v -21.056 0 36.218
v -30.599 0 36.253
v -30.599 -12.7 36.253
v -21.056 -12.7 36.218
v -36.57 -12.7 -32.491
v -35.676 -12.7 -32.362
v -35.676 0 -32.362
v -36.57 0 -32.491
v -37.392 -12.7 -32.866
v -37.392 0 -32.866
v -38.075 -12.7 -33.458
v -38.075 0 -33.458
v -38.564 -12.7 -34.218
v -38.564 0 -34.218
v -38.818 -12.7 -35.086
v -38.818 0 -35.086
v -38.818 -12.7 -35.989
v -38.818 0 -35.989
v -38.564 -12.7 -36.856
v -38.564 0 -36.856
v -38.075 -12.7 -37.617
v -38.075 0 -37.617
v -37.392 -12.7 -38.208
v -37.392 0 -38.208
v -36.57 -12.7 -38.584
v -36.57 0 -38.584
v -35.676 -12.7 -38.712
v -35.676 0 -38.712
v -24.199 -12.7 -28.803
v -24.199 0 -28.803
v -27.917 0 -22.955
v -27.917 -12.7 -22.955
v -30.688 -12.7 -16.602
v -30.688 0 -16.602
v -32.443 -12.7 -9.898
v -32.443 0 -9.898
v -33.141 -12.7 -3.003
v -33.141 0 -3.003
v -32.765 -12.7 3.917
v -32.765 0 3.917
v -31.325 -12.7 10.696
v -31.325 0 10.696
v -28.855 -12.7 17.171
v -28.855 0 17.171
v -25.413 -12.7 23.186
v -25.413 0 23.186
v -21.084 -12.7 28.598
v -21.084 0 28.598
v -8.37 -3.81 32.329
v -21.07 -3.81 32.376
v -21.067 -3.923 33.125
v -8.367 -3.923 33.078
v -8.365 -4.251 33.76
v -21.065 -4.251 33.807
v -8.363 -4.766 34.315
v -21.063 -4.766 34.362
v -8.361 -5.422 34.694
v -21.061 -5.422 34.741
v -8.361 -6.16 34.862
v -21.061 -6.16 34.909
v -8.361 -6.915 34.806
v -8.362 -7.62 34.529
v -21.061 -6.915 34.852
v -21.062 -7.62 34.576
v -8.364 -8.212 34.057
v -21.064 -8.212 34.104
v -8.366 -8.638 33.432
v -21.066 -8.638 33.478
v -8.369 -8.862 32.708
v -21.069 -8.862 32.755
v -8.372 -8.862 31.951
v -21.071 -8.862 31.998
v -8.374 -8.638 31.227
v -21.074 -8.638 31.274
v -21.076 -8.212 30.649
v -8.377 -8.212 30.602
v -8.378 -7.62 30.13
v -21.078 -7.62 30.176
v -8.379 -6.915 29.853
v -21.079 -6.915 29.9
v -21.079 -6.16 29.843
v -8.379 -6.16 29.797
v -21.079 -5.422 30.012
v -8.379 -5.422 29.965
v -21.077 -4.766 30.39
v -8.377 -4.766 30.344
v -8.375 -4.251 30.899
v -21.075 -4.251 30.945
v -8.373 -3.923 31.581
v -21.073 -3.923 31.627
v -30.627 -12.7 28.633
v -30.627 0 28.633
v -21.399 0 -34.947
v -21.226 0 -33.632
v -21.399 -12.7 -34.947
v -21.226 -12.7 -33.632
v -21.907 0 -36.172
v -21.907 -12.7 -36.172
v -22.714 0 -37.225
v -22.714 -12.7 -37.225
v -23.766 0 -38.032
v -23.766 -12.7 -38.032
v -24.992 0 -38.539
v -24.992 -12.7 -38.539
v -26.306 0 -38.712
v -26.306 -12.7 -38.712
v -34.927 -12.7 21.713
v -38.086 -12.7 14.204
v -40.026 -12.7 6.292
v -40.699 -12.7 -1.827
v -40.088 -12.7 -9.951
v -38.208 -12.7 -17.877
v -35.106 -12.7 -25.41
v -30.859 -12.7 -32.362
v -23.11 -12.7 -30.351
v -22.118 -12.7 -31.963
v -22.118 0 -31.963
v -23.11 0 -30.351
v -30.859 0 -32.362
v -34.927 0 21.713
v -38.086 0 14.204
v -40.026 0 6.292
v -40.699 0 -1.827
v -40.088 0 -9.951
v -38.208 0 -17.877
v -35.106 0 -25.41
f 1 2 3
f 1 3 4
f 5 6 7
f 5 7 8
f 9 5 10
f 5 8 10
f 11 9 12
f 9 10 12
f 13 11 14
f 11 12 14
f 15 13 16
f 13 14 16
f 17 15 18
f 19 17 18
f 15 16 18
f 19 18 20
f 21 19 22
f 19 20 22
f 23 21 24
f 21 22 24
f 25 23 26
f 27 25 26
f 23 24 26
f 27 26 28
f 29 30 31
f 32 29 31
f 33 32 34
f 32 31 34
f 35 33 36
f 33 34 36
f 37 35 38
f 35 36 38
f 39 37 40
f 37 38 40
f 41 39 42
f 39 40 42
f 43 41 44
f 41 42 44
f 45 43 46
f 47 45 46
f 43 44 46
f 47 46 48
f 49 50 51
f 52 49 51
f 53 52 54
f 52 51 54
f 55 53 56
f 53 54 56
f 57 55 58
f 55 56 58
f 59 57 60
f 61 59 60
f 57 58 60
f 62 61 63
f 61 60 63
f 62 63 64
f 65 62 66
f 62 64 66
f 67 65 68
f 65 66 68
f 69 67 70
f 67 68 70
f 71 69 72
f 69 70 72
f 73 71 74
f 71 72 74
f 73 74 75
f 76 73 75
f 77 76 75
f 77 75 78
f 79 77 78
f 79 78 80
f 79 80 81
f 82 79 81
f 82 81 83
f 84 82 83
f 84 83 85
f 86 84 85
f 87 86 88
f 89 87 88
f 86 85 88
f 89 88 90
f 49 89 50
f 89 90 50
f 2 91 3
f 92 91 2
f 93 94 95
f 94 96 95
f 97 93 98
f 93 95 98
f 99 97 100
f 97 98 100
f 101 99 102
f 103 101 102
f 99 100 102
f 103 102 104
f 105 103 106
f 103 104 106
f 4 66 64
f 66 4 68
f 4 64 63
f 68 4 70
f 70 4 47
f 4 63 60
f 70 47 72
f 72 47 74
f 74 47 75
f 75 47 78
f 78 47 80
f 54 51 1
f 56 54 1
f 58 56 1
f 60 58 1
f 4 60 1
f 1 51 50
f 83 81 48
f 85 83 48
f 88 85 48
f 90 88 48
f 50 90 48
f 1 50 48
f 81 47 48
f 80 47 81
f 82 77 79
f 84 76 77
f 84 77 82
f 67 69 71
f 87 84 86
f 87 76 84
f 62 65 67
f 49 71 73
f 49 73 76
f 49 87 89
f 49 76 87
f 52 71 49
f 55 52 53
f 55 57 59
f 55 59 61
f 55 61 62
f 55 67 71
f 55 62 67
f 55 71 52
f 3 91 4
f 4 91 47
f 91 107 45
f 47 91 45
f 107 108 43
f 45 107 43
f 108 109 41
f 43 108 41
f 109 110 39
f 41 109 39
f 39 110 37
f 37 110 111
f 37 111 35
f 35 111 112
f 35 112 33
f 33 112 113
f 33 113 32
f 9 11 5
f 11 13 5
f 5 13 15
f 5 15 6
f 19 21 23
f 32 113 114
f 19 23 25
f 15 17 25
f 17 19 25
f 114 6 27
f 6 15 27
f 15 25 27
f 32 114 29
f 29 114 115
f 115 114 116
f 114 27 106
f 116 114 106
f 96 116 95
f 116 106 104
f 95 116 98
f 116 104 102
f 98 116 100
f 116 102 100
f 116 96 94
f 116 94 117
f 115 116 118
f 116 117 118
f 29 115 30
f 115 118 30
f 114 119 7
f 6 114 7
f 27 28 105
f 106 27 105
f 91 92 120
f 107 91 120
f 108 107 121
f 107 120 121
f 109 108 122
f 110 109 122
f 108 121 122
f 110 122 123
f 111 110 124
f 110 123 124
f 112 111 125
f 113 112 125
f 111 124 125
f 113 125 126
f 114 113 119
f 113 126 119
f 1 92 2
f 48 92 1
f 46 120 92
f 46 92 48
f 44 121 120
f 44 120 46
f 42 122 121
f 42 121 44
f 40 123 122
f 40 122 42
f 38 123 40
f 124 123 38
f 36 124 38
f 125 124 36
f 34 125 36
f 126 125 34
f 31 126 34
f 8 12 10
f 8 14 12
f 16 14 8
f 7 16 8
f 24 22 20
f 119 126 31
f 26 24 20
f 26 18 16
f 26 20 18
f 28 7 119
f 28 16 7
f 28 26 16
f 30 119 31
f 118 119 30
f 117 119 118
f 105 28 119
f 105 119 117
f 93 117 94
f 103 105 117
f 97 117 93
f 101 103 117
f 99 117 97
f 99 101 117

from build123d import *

# Parameters (mm, degrees)
F1_DEPTH    = 12.7
F2_W        = 9.5430067153
F2_H        = 12.7
F3_DEPTH    = 7.62
F4_R        = 2.54
F5_DEPTH    = 12.7
F6_R        = 5.08
F7_T1_DEPTH = 35.8885048544


# Not quite as in the source:
# - a fillet or chamfer that OpenCascade refuses, or shapes differently, is made with other operations: its cross-section is extruded or revolved along the edge and cut away or added


with BuildPart() as f1:
    # F0 (on Front) → F1 (new body)
    with BuildSketch(Plane.XZ):
        with BuildLine():
            Line((-21.0839635167, 28.5975757856), (-30.6269058684, 28.632624914))
            ThreePointArc((-30.6269058684, 28.632624914), (-40.6992100974, -1.826971115), (-30.8592707303, -32.3624242144))
            Line((-30.8592707303, -32.3624242144), (-21.2263563985, -32.3624242144))
            ThreePointArc((-21.2263563985, -32.3624242144), (-33.1531180249, -1.8543988892), (-21.0839635167, 28.5975757856))
        make_face()
        Polygon((-21.2263563985, -32.3624242144), (-30.8592707303, -32.3624242144), (-35.6757278961, -32.3624242144), (-35.6757278961, -38.7124242144), (-21.2263563985, -38.7124242144), align=None)
        with BuildLine():
            Line((-35.6757278961, -38.7124242144), (-35.6757278961, -32.3624242144))
            ThreePointArc((-35.6757278961, -32.3624242144), (-38.8507278961, -35.5374242144), (-35.6757278961, -38.7124242144))
        make_face()
    extrude(amount=F1_DEPTH)

    # F2 (on face) → F3 (join)
    with BuildSketch(Plane(origin=(0.1047467849, 0, 28.519754313), x_dir=(0.9999932554, 0, -0.0036727553), z_dir=(0.0036727553, 0, 0.9999932554))):
        with Locations((-25.9603565693, -6.35)):
            Rectangle(F2_W, F2_H)
    extrude(amount=F3_DEPTH)

    # F4 (on face) → F5 (join)
    with BuildSketch(Plane(origin=(-21.1887103016, 0, 0.0778214726), x_dir=(0, 1, 0), z_dir=(0.9999932554, 0, -0.0036727553))):
        with Locations((-6.35, 32.2985388339)):
            Circle(F4_R)
    extrude(amount=F5_DEPTH)

    # F6
    f6_edges = [f1.edges().sort_by_distance(p)[0] for p in [
        (-21.226356, -6.35, -38.712424),
    ]]
    fillet(f6_edges, radius=F6_R)

    # F7: fillet of radius 30.8120471725 on 1 edges, made by hand

    # F7_s2 → F7_t1 (cut)
    with BuildSketch(Plane.XZ.offset(-11.5942524272)):
        with BuildLine():
            ThreePointArc((-21.2263563985, -33.6324242144), (-22.6013772134, -31.1490637357), (-24.1991044236, -28.8027838569))
            ThreePointArc((-24.1991044236, -28.8027838569), (-22.7589105371, -30.6211702571), (-21.2263563985, -32.3624242144))
            Line((-21.2263563985, -32.3624242144), (-21.2263563985, -33.6324242144))
        make_face()
    extrude(amount=F7_T1_DEPTH, mode=Mode.SUBTRACT)


solid = f1.part
